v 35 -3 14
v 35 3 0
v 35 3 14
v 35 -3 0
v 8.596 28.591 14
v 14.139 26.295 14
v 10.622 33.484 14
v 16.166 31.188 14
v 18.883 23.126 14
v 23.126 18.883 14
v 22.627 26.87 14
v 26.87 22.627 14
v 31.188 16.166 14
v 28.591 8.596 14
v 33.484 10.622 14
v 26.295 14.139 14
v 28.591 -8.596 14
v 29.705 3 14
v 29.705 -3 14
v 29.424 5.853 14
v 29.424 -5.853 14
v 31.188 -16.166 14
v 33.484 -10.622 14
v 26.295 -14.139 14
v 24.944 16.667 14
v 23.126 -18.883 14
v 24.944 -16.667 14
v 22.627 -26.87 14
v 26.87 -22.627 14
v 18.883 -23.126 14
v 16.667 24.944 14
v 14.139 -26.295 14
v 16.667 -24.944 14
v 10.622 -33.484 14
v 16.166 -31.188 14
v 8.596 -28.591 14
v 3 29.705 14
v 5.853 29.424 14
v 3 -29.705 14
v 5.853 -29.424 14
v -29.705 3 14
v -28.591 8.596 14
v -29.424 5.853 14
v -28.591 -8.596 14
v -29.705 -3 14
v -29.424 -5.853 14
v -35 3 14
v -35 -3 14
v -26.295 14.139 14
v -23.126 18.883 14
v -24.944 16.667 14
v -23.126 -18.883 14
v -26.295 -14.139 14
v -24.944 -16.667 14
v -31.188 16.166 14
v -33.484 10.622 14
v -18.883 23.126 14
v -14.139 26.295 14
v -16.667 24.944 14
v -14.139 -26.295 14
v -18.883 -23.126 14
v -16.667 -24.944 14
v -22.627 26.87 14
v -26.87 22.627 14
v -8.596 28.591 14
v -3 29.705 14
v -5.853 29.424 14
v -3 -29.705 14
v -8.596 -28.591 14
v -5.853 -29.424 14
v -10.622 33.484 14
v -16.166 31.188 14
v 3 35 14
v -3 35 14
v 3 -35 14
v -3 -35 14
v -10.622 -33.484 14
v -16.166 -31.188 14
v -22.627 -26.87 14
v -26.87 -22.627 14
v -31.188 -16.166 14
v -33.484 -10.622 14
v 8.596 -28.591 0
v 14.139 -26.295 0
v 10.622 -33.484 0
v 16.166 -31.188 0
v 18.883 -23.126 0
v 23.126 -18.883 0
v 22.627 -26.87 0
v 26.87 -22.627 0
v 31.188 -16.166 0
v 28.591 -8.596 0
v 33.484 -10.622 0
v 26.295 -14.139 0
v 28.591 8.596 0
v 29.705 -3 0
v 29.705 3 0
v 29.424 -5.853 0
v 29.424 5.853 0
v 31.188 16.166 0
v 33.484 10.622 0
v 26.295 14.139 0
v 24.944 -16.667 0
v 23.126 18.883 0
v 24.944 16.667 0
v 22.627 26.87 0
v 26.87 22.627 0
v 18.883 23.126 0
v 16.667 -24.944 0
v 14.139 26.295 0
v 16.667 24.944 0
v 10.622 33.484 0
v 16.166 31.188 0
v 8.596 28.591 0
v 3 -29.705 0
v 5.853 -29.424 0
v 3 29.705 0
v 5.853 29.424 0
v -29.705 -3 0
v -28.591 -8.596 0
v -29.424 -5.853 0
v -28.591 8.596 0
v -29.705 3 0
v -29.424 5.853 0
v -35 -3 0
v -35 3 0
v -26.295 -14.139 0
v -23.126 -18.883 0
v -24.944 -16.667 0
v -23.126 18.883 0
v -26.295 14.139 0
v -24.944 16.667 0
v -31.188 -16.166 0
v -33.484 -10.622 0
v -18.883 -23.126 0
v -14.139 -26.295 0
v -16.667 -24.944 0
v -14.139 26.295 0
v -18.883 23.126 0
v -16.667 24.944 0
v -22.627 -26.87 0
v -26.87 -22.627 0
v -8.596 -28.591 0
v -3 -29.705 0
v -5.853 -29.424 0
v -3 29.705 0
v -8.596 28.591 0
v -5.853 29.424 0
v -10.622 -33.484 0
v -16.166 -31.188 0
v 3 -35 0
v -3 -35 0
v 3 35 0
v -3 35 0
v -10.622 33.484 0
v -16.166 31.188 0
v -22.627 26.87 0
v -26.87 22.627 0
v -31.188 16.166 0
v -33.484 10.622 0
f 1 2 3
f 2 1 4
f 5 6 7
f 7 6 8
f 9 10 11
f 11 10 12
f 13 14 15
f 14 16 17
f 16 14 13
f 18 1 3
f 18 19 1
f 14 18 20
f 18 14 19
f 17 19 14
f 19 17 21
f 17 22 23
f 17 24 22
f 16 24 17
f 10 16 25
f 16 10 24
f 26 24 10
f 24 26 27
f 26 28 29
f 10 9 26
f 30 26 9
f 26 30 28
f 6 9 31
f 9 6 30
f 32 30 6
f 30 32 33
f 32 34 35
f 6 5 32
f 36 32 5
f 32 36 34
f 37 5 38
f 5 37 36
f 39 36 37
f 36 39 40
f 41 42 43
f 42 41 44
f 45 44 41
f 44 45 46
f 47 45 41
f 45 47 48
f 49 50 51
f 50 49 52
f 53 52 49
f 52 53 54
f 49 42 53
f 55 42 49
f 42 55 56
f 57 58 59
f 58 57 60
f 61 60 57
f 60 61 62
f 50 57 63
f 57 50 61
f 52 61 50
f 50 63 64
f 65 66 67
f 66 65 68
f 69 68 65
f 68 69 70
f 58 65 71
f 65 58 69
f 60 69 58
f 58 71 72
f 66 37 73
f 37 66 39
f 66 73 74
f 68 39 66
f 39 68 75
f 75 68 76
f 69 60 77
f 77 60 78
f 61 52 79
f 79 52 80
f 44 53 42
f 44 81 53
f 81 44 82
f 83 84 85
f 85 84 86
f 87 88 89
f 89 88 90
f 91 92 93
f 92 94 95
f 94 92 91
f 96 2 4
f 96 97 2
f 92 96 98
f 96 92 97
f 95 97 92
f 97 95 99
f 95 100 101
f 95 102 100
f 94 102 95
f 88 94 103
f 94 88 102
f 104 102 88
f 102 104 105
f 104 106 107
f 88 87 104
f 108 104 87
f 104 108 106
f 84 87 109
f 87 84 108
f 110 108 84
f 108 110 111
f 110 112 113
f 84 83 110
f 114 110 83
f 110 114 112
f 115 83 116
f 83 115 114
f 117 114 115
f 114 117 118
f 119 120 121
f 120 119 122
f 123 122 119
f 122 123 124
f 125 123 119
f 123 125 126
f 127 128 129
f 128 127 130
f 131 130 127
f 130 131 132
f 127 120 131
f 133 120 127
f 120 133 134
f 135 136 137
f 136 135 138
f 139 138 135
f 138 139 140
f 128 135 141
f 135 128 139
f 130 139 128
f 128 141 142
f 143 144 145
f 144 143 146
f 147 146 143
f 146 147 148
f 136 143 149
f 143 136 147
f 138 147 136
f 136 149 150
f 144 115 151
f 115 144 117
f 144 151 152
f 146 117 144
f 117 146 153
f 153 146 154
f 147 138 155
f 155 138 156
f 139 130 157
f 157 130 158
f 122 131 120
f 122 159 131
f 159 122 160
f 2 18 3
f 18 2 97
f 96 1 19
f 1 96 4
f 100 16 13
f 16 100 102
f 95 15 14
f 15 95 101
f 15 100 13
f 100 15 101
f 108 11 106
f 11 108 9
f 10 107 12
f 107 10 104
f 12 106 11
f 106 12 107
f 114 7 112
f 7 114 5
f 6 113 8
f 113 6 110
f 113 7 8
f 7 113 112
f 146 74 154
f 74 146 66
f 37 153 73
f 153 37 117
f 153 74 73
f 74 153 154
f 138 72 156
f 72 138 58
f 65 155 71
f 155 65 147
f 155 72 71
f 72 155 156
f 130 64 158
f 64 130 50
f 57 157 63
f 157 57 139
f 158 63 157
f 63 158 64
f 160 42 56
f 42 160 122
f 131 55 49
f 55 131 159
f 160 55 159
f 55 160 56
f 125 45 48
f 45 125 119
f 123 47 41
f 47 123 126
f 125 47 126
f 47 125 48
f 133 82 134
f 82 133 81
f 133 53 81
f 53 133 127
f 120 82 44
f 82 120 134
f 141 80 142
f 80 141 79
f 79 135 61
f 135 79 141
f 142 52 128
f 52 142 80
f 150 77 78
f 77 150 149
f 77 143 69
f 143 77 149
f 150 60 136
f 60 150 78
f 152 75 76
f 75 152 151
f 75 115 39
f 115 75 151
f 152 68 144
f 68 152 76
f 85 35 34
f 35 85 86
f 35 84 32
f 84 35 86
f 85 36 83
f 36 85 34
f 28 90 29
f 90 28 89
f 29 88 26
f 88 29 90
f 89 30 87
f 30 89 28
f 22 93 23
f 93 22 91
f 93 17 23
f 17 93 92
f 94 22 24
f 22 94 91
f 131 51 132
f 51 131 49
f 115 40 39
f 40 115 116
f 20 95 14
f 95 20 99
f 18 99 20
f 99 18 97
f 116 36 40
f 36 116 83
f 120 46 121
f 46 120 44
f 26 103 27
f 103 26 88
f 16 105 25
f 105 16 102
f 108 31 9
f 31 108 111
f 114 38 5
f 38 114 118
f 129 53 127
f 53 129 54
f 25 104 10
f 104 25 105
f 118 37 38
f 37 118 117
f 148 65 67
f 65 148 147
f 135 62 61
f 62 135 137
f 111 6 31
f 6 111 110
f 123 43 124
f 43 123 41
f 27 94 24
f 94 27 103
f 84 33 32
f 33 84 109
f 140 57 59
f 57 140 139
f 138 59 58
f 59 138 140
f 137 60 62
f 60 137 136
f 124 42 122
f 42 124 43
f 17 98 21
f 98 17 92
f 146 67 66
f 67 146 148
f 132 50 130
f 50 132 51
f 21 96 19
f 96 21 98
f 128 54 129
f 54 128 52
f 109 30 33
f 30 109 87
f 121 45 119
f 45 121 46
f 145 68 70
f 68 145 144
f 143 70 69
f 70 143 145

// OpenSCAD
$fn = 32;

// ----------------------------------------------------------------------
// Spur blank: plain gear blank
// ----------------------------------------------------------------------

// --- parameters (mm) ---
disc_r = 30;              // blank root radius
disc_t = 14;              // blank thickness
n_teeth = 16;             // stub tooth count
tooth_w = 6;              // tooth width at the root
tooth_h = 5;              // tooth height above the root
fit_tol = 0.05;           // tolerance for press fits, mm
free_tol = 0.2;           // tolerance for clearance fits, mm

out_r = disc_r + tooth_h;  // tip radius
bbox_x = 70.0;  // measured width over the teeth
bbox_y = 70.0;  // measured depth over the teeth

union() {
  cylinder(r = disc_r, h = disc_t);
  for (i = [0 : n_teeth - 1])
    rotate([0, 0, i * 360 / n_teeth])
      translate([disc_r - 1, -tooth_w / 2, 0])
        cube([tooth_h + 1, tooth_w, disc_t]);
}
